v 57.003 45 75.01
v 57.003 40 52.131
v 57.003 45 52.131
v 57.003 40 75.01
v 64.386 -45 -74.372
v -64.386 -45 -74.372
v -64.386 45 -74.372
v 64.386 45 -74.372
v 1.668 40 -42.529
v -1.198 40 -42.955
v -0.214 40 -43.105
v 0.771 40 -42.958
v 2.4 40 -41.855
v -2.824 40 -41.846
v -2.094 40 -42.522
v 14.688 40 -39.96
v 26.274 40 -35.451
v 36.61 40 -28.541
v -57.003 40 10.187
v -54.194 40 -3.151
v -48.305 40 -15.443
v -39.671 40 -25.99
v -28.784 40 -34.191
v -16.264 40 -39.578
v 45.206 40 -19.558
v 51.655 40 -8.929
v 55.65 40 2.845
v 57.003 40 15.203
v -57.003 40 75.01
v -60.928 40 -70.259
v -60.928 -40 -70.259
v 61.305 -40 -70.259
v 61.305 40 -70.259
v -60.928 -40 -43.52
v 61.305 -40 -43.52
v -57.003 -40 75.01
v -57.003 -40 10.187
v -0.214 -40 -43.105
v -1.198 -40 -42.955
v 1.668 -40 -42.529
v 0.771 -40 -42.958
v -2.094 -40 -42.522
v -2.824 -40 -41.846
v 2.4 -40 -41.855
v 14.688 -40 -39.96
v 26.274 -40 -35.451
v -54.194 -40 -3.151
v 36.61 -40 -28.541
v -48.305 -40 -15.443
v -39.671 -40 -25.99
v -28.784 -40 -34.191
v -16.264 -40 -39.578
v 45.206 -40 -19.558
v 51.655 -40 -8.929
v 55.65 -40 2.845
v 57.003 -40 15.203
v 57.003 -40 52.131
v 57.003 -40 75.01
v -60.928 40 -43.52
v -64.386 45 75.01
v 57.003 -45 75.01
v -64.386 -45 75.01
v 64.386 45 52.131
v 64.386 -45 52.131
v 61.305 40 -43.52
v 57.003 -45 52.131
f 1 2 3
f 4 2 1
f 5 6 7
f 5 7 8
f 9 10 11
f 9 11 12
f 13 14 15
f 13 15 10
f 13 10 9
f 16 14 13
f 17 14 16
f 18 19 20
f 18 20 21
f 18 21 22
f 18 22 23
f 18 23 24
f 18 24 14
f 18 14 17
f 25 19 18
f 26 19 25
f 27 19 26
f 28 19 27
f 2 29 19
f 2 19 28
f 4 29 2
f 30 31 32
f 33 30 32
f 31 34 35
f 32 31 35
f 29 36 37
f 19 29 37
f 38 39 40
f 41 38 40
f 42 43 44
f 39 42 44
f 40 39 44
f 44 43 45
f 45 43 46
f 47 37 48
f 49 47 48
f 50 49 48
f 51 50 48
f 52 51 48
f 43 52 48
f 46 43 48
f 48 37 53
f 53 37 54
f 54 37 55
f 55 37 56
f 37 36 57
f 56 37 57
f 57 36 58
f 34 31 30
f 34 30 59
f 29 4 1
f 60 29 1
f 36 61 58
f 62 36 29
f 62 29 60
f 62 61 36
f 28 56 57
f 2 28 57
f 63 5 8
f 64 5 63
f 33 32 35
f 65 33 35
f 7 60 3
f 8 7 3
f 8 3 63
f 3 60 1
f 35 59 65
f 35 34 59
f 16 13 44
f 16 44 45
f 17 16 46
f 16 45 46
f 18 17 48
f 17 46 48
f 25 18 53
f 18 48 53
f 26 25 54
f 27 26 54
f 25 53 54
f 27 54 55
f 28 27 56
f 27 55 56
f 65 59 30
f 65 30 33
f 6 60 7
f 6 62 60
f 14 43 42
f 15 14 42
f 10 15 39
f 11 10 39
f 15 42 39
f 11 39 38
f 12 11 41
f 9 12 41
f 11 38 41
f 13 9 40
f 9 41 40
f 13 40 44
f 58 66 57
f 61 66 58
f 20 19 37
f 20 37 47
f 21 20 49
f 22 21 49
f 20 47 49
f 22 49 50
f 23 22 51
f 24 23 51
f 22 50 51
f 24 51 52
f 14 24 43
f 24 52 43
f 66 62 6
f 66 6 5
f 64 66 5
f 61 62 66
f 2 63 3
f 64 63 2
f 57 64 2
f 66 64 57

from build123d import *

# Parameters (mm, degrees)
F0_W     = 122.23322317
F0_H     = 26.7385169864
F1_DEPTH = 45
F2_DEPTH = 40
F3_DEPTH = 40


with BuildPart() as f1:
    # F0 (on Front) → F1 (new body, symmetric)
    with BuildSketch(Plane.XZ):
        with BuildLine():
            Line((-57.0032522082, 75.0096067786), (-64.3862187862, 75.0096067786))
            Line((-64.3862187862, 75.0096067786), (-64.3862187862, -74.3724256754))
            Line((-64.3862187862, -74.3724256754), (0, -74.3724256754))
            Line((0, -74.3724256754), (64.3862187862, -74.3724256754))
            Line((64.3862187862, -74.3724256754), (64.3862187862, 52.1305650473))
            Line((64.3862187862, 52.1305650473), (57.0032522082, 52.1305650473))
            Line((57.0032522082, 52.1305650473), (57.0032522082, 15.2034306045))
            ThreePointArc((57.0032522082, 15.2034306045), (41.1532258631, -24.2843129669), (2.40046245, -41.8549861284))
            ThreePointArc((2.40046245, -41.8549861284), (-0.213800426, -43.1045012545), (-2.8236144574, -41.8457204329))
            ThreePointArc((-2.8236144574, -41.8457204329), (-39.6712510694, -25.9900753758), (-57.0032522082, 10.1865958446))
            Line((-57.0032522082, 10.1865958446), (-57.0032522082, 75.0096067786))
        make_face()
        with Locations((0.1888852566, -56.8894036114)):
            Rectangle(F0_W, F0_H, mode=Mode.SUBTRACT)
        with BuildLine():
            Line((57.0032522082, 75.0096067786), (-57.0032522082, 75.0096067786))
            Line((-57.0032522082, 75.0096067786), (-57.0032522082, 10.1865958446))
            ThreePointArc((-57.0032522082, 10.1865958446), (-39.6712510694, -25.9900753758), (-2.8236144574, -41.8457204329))
            ThreePointArc((-2.8236144574, -41.8457204329), (-0.2116819988, -41.9101142032), (2.40046245, -41.8549861284))
            ThreePointArc((2.40046245, -41.8549861284), (41.1532258631, -24.2843129669), (57.0032522082, 15.2034306045))
            Line((57.0032522082, 15.2034306045), (57.0032522082, 52.1305650473))
            Line((57.0032522082, 52.1305650473), (57.0032522082, 75.0096067786))
        make_face()
        with Locations((0.1888852566, -56.8894036114)):
            Rectangle(F0_W, F0_H)
        with BuildLine():
            ThreePointArc((2.40046245, -41.8549861284), (-0.2116819988, -41.9101142032), (-2.8236144574, -41.8457204329))
            ThreePointArc((-2.8236144574, -41.8457204329), (-0.213800426, -43.1045012545), (2.40046245, -41.8549861284))
        make_face()
    extrude(amount=F1_DEPTH, both=True)

    # F0 (on Front) → F2 (cut, symmetric)
    with BuildSketch(Plane.XZ):
        with BuildLine():
            Line((57.0032522082, 75.0096067786), (-57.0032522082, 75.0096067786))
            Line((-57.0032522082, 75.0096067786), (-57.0032522082, 10.1865958446))
            ThreePointArc((-57.0032522082, 10.1865958446), (-39.6712510694, -25.9900753758), (-2.8236144574, -41.8457204329))
            ThreePointArc((-2.8236144574, -41.8457204329), (-0.2116819988, -41.9101142032), (2.40046245, -41.8549861284))
            ThreePointArc((2.40046245, -41.8549861284), (41.1532258631, -24.2843129669), (57.0032522082, 15.2034306045))
            Line((57.0032522082, 15.2034306045), (57.0032522082, 52.1305650473))
            Line((57.0032522082, 52.1305650473), (57.0032522082, 75.0096067786))
        make_face()
        with BuildLine():
            ThreePointArc((2.40046245, -41.8549861284), (-0.2116819988, -41.9101142032), (-2.8236144574, -41.8457204329))
            ThreePointArc((-2.8236144574, -41.8457204329), (-0.213800426, -43.1045012545), (2.40046245, -41.8549861284))
        make_face()
    extrude(amount=F2_DEPTH, both=True, mode=Mode.SUBTRACT)

    # F0 (on Front) → F3 (cut, symmetric)
    with BuildSketch(Plane.XZ):
        with Locations((0.1888852566, -56.8894036114)):
            Rectangle(F0_W, F0_H)
    extrude(amount=F3_DEPTH, both=True, mode=Mode.SUBTRACT)


solid = f1.part
